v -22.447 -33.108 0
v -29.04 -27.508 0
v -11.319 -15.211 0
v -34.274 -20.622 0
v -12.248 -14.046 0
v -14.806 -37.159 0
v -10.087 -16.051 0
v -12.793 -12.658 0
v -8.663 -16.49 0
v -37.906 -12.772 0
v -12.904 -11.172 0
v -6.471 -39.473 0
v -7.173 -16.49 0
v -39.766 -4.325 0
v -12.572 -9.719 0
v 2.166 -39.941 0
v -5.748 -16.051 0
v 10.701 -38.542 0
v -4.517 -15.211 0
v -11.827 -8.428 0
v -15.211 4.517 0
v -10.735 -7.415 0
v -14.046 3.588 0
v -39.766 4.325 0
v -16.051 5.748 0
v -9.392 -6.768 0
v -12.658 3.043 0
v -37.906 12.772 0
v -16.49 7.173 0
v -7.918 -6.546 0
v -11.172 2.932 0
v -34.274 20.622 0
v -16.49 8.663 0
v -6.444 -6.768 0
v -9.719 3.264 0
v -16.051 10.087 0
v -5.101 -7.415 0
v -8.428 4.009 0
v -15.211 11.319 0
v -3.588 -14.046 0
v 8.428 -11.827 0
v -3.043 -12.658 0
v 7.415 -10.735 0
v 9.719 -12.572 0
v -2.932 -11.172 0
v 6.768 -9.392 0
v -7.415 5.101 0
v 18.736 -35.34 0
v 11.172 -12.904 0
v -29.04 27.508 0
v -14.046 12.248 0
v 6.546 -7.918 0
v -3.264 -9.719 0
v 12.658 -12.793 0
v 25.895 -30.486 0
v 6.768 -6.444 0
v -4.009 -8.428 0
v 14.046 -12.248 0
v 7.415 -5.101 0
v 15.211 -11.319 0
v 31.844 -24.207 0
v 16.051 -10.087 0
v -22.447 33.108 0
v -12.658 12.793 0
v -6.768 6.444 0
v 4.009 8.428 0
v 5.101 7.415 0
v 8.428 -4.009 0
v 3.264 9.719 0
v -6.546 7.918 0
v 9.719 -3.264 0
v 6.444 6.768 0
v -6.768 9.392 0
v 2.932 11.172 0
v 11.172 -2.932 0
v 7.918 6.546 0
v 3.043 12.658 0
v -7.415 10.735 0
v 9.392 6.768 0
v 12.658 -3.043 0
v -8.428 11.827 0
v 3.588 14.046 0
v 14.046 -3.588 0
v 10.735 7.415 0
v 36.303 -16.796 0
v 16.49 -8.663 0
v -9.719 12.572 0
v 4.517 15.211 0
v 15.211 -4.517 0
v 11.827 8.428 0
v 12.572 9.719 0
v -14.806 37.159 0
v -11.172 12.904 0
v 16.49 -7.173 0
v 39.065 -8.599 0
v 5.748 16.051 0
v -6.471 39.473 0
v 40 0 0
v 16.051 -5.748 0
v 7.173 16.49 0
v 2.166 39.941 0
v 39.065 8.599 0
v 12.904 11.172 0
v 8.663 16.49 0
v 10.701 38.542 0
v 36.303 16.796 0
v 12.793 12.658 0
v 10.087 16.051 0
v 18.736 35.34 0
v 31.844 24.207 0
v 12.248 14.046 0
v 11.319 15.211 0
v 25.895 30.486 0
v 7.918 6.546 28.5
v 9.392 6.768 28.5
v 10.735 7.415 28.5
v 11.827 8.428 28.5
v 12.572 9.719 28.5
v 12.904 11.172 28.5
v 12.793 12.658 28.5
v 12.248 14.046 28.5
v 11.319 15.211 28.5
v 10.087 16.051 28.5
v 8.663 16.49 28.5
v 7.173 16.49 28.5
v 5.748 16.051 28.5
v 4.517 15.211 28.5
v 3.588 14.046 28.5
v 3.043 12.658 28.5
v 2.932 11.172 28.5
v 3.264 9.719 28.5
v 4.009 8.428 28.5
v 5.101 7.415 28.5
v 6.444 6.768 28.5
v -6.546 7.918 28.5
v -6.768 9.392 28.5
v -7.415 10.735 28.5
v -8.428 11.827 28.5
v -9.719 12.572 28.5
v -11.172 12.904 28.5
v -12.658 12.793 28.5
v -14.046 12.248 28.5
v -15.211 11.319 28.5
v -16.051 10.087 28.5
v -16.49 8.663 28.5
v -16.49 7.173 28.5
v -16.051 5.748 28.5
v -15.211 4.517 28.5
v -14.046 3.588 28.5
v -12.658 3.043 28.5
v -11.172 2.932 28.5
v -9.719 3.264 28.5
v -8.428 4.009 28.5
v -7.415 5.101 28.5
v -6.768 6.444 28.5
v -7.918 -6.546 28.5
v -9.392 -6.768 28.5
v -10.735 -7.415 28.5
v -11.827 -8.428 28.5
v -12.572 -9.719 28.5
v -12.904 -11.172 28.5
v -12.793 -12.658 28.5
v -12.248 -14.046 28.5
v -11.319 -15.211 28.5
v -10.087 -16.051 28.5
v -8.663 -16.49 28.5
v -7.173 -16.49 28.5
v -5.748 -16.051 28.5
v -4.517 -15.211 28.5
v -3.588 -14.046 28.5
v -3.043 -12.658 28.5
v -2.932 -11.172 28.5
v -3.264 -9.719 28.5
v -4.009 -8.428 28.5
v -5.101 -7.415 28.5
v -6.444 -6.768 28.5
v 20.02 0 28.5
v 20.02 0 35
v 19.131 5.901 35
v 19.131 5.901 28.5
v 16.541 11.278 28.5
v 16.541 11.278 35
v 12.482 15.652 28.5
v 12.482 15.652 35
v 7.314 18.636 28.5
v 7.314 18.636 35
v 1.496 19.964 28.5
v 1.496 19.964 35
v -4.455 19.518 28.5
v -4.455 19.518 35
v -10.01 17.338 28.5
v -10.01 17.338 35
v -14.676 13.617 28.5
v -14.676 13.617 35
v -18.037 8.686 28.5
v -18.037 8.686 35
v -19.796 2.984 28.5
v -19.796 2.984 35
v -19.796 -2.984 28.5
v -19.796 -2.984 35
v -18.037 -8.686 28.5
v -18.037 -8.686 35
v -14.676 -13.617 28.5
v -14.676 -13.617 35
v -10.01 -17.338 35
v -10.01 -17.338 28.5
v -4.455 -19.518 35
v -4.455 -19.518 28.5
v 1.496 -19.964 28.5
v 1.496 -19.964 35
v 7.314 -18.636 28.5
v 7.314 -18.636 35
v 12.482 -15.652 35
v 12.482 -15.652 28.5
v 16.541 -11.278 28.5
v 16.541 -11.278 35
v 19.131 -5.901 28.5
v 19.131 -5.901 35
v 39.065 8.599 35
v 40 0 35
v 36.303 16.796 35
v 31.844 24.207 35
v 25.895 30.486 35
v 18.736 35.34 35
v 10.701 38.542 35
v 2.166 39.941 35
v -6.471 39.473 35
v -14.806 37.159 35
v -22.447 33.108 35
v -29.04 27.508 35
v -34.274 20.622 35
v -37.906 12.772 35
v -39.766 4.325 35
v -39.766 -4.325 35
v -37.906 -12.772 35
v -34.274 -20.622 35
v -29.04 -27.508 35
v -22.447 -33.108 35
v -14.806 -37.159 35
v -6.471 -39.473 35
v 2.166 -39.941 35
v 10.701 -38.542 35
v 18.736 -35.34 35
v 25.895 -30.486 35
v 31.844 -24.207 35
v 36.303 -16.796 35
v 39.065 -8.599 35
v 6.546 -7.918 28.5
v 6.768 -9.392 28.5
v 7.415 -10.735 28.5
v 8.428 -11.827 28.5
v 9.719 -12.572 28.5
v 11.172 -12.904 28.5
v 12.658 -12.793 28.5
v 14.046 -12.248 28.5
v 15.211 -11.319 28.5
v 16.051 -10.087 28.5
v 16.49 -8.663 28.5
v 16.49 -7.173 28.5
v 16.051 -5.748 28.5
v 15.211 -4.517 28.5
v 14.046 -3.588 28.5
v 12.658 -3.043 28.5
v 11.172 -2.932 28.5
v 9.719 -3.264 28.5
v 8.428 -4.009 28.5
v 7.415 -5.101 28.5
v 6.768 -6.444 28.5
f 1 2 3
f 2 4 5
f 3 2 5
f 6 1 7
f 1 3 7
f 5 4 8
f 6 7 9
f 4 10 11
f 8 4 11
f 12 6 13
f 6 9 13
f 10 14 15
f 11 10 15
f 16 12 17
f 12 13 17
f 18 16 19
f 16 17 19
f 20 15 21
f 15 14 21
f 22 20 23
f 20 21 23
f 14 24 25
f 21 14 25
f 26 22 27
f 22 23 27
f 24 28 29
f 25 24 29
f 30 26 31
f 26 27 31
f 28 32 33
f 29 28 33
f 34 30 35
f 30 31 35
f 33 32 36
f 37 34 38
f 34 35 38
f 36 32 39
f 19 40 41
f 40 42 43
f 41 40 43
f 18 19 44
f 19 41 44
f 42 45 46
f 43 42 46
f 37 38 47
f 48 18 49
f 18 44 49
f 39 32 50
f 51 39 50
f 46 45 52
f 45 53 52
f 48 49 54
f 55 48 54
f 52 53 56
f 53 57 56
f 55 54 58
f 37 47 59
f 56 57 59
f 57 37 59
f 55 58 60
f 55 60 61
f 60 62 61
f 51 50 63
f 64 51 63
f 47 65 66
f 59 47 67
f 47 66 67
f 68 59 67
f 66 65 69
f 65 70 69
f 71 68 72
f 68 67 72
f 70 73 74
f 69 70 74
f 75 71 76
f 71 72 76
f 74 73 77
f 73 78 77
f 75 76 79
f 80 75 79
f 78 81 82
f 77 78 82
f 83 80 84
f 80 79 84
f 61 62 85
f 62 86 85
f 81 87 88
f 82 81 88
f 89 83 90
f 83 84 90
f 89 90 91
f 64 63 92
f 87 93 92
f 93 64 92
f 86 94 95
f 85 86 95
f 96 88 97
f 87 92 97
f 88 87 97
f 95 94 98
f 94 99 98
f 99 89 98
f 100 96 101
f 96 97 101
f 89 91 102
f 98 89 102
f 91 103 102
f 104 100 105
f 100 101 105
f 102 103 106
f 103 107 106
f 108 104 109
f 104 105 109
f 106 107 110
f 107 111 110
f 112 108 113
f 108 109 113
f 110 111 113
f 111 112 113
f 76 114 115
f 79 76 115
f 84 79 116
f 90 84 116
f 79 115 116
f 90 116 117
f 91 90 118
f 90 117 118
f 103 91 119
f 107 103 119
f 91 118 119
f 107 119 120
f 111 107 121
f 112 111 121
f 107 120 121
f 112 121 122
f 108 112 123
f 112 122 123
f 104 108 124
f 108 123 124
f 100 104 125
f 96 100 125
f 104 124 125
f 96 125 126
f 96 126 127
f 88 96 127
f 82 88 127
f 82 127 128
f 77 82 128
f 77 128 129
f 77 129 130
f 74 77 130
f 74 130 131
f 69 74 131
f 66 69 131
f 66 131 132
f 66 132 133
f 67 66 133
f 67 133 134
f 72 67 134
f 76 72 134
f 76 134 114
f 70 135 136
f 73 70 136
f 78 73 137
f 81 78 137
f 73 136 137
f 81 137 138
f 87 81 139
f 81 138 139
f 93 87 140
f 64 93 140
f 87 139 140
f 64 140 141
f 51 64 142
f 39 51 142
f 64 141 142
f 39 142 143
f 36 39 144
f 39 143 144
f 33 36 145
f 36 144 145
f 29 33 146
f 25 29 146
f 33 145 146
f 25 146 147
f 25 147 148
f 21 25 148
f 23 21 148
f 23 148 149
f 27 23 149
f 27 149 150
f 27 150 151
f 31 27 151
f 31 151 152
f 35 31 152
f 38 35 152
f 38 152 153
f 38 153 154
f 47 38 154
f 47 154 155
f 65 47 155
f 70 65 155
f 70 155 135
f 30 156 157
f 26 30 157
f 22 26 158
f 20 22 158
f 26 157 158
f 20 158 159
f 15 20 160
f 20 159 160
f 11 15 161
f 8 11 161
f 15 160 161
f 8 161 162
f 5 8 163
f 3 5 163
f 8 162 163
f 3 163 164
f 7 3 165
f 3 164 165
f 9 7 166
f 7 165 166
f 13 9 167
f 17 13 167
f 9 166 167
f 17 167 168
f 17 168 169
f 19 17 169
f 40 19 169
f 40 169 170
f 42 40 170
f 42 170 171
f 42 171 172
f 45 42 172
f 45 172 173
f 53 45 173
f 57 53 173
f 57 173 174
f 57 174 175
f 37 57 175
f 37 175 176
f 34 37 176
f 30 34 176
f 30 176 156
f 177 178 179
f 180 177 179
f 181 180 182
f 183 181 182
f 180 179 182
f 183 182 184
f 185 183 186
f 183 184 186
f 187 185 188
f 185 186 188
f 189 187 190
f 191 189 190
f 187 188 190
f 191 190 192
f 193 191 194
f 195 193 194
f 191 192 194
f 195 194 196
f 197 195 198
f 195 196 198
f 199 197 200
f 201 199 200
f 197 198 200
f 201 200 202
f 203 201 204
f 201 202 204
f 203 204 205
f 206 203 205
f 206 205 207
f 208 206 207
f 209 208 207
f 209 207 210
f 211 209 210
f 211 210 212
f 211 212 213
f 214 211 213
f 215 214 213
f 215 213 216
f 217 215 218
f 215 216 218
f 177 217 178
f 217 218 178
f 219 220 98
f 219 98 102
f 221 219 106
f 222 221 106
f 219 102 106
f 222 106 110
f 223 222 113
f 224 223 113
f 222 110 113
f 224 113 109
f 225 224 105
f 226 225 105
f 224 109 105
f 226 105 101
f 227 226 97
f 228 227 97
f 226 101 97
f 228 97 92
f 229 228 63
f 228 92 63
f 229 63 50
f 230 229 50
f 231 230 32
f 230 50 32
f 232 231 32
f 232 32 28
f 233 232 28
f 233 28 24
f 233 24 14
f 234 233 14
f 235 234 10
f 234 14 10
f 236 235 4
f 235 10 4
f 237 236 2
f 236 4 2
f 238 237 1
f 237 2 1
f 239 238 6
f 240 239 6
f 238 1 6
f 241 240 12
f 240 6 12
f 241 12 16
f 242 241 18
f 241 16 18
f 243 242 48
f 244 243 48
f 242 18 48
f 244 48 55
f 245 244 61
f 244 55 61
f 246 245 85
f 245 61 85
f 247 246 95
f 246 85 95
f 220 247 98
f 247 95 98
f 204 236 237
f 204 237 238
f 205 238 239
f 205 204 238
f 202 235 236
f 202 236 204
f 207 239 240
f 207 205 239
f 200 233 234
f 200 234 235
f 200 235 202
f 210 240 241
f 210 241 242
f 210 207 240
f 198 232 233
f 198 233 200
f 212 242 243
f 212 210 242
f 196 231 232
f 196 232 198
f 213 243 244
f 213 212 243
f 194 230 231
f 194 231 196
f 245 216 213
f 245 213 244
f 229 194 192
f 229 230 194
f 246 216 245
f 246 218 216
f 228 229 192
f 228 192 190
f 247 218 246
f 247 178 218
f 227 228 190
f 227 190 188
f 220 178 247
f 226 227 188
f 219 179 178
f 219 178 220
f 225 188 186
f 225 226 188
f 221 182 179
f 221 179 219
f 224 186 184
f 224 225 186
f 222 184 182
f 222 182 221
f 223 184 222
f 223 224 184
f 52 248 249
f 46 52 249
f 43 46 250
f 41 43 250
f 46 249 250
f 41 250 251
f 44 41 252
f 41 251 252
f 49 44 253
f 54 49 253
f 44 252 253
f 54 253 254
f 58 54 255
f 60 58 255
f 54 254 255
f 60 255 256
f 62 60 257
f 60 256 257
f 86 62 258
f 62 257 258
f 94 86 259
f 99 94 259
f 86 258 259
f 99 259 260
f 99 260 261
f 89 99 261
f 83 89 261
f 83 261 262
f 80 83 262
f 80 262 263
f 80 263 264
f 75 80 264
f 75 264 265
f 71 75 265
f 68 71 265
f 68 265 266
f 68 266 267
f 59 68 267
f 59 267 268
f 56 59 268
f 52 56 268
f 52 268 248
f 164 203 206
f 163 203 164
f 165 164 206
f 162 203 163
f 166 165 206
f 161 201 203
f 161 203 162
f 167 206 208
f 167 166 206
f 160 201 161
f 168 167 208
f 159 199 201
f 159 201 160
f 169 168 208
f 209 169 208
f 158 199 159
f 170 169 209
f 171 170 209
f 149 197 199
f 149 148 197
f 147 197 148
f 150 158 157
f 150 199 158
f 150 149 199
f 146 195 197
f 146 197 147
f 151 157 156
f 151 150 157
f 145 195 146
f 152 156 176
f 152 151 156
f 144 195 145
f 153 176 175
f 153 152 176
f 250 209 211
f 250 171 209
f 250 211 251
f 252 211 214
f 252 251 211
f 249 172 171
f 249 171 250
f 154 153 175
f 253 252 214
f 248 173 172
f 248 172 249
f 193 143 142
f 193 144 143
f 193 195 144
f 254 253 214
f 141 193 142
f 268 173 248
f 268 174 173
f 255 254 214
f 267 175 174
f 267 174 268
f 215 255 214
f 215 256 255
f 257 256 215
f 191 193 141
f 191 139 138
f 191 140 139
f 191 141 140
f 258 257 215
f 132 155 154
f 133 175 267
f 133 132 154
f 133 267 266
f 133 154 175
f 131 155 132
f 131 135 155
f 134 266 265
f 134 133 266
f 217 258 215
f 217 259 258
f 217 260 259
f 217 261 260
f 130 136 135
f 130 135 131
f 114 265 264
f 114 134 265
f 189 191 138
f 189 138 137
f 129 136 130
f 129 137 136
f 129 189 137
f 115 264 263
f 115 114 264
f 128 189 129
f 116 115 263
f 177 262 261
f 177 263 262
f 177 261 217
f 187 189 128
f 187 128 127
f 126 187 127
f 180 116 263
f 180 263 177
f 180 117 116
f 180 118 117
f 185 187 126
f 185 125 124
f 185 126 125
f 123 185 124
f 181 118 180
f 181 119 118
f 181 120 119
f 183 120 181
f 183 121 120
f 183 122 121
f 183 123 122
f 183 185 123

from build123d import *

# Parameters (mm, degrees)
SKETCH1_R           = 40
BOSS_EXTRUDE1_DEPTH = 35
SKETCH2_R           = 20.02
CUT_EXTRUDE2_DEPTH  = 6.5
SKETCH3_R           = 5
CUT_EXTRUDE3_DEPTH  = 67.520673478
CIRPATTERN1_COUNT   = 4


with BuildPart() as part:
    # Sketch1 → Boss-Extrude1 (new body)
    with BuildSketch(Plane.XY):
        Circle(SKETCH1_R)
    extrude(amount=BOSS_EXTRUDE1_DEPTH)

    # Sketch2 → Cut-Extrude2 (cut)
    with BuildSketch(Plane.XY.offset(35)):
        Circle(SKETCH2_R)
    extrude(amount=-CUT_EXTRUDE2_DEPTH, mode=Mode.SUBTRACT)

    # Sketch3 → Cut-Extrude3 (cut, through all)
    with BuildSketch(Plane.XY.offset(35)):
        with Locations((-11.545851026, 7.917911598)):
            Circle(SKETCH3_R)
    cut_extrude3 = extrude(amount=-CUT_EXTRUDE3_DEPTH, mode=Mode.SUBTRACT)

    # CirPattern1: Cut-Extrude3 ×4 about axis
    cirpattern1_axis = Axis((0, 0, 0), (0, 0, 1))
    for i in range(1, CIRPATTERN1_COUNT):
        add(cut_extrude3.rotate(cirpattern1_axis, i * 360 / CIRPATTERN1_COUNT), mode=Mode.SUBTRACT)


solid = part.part
